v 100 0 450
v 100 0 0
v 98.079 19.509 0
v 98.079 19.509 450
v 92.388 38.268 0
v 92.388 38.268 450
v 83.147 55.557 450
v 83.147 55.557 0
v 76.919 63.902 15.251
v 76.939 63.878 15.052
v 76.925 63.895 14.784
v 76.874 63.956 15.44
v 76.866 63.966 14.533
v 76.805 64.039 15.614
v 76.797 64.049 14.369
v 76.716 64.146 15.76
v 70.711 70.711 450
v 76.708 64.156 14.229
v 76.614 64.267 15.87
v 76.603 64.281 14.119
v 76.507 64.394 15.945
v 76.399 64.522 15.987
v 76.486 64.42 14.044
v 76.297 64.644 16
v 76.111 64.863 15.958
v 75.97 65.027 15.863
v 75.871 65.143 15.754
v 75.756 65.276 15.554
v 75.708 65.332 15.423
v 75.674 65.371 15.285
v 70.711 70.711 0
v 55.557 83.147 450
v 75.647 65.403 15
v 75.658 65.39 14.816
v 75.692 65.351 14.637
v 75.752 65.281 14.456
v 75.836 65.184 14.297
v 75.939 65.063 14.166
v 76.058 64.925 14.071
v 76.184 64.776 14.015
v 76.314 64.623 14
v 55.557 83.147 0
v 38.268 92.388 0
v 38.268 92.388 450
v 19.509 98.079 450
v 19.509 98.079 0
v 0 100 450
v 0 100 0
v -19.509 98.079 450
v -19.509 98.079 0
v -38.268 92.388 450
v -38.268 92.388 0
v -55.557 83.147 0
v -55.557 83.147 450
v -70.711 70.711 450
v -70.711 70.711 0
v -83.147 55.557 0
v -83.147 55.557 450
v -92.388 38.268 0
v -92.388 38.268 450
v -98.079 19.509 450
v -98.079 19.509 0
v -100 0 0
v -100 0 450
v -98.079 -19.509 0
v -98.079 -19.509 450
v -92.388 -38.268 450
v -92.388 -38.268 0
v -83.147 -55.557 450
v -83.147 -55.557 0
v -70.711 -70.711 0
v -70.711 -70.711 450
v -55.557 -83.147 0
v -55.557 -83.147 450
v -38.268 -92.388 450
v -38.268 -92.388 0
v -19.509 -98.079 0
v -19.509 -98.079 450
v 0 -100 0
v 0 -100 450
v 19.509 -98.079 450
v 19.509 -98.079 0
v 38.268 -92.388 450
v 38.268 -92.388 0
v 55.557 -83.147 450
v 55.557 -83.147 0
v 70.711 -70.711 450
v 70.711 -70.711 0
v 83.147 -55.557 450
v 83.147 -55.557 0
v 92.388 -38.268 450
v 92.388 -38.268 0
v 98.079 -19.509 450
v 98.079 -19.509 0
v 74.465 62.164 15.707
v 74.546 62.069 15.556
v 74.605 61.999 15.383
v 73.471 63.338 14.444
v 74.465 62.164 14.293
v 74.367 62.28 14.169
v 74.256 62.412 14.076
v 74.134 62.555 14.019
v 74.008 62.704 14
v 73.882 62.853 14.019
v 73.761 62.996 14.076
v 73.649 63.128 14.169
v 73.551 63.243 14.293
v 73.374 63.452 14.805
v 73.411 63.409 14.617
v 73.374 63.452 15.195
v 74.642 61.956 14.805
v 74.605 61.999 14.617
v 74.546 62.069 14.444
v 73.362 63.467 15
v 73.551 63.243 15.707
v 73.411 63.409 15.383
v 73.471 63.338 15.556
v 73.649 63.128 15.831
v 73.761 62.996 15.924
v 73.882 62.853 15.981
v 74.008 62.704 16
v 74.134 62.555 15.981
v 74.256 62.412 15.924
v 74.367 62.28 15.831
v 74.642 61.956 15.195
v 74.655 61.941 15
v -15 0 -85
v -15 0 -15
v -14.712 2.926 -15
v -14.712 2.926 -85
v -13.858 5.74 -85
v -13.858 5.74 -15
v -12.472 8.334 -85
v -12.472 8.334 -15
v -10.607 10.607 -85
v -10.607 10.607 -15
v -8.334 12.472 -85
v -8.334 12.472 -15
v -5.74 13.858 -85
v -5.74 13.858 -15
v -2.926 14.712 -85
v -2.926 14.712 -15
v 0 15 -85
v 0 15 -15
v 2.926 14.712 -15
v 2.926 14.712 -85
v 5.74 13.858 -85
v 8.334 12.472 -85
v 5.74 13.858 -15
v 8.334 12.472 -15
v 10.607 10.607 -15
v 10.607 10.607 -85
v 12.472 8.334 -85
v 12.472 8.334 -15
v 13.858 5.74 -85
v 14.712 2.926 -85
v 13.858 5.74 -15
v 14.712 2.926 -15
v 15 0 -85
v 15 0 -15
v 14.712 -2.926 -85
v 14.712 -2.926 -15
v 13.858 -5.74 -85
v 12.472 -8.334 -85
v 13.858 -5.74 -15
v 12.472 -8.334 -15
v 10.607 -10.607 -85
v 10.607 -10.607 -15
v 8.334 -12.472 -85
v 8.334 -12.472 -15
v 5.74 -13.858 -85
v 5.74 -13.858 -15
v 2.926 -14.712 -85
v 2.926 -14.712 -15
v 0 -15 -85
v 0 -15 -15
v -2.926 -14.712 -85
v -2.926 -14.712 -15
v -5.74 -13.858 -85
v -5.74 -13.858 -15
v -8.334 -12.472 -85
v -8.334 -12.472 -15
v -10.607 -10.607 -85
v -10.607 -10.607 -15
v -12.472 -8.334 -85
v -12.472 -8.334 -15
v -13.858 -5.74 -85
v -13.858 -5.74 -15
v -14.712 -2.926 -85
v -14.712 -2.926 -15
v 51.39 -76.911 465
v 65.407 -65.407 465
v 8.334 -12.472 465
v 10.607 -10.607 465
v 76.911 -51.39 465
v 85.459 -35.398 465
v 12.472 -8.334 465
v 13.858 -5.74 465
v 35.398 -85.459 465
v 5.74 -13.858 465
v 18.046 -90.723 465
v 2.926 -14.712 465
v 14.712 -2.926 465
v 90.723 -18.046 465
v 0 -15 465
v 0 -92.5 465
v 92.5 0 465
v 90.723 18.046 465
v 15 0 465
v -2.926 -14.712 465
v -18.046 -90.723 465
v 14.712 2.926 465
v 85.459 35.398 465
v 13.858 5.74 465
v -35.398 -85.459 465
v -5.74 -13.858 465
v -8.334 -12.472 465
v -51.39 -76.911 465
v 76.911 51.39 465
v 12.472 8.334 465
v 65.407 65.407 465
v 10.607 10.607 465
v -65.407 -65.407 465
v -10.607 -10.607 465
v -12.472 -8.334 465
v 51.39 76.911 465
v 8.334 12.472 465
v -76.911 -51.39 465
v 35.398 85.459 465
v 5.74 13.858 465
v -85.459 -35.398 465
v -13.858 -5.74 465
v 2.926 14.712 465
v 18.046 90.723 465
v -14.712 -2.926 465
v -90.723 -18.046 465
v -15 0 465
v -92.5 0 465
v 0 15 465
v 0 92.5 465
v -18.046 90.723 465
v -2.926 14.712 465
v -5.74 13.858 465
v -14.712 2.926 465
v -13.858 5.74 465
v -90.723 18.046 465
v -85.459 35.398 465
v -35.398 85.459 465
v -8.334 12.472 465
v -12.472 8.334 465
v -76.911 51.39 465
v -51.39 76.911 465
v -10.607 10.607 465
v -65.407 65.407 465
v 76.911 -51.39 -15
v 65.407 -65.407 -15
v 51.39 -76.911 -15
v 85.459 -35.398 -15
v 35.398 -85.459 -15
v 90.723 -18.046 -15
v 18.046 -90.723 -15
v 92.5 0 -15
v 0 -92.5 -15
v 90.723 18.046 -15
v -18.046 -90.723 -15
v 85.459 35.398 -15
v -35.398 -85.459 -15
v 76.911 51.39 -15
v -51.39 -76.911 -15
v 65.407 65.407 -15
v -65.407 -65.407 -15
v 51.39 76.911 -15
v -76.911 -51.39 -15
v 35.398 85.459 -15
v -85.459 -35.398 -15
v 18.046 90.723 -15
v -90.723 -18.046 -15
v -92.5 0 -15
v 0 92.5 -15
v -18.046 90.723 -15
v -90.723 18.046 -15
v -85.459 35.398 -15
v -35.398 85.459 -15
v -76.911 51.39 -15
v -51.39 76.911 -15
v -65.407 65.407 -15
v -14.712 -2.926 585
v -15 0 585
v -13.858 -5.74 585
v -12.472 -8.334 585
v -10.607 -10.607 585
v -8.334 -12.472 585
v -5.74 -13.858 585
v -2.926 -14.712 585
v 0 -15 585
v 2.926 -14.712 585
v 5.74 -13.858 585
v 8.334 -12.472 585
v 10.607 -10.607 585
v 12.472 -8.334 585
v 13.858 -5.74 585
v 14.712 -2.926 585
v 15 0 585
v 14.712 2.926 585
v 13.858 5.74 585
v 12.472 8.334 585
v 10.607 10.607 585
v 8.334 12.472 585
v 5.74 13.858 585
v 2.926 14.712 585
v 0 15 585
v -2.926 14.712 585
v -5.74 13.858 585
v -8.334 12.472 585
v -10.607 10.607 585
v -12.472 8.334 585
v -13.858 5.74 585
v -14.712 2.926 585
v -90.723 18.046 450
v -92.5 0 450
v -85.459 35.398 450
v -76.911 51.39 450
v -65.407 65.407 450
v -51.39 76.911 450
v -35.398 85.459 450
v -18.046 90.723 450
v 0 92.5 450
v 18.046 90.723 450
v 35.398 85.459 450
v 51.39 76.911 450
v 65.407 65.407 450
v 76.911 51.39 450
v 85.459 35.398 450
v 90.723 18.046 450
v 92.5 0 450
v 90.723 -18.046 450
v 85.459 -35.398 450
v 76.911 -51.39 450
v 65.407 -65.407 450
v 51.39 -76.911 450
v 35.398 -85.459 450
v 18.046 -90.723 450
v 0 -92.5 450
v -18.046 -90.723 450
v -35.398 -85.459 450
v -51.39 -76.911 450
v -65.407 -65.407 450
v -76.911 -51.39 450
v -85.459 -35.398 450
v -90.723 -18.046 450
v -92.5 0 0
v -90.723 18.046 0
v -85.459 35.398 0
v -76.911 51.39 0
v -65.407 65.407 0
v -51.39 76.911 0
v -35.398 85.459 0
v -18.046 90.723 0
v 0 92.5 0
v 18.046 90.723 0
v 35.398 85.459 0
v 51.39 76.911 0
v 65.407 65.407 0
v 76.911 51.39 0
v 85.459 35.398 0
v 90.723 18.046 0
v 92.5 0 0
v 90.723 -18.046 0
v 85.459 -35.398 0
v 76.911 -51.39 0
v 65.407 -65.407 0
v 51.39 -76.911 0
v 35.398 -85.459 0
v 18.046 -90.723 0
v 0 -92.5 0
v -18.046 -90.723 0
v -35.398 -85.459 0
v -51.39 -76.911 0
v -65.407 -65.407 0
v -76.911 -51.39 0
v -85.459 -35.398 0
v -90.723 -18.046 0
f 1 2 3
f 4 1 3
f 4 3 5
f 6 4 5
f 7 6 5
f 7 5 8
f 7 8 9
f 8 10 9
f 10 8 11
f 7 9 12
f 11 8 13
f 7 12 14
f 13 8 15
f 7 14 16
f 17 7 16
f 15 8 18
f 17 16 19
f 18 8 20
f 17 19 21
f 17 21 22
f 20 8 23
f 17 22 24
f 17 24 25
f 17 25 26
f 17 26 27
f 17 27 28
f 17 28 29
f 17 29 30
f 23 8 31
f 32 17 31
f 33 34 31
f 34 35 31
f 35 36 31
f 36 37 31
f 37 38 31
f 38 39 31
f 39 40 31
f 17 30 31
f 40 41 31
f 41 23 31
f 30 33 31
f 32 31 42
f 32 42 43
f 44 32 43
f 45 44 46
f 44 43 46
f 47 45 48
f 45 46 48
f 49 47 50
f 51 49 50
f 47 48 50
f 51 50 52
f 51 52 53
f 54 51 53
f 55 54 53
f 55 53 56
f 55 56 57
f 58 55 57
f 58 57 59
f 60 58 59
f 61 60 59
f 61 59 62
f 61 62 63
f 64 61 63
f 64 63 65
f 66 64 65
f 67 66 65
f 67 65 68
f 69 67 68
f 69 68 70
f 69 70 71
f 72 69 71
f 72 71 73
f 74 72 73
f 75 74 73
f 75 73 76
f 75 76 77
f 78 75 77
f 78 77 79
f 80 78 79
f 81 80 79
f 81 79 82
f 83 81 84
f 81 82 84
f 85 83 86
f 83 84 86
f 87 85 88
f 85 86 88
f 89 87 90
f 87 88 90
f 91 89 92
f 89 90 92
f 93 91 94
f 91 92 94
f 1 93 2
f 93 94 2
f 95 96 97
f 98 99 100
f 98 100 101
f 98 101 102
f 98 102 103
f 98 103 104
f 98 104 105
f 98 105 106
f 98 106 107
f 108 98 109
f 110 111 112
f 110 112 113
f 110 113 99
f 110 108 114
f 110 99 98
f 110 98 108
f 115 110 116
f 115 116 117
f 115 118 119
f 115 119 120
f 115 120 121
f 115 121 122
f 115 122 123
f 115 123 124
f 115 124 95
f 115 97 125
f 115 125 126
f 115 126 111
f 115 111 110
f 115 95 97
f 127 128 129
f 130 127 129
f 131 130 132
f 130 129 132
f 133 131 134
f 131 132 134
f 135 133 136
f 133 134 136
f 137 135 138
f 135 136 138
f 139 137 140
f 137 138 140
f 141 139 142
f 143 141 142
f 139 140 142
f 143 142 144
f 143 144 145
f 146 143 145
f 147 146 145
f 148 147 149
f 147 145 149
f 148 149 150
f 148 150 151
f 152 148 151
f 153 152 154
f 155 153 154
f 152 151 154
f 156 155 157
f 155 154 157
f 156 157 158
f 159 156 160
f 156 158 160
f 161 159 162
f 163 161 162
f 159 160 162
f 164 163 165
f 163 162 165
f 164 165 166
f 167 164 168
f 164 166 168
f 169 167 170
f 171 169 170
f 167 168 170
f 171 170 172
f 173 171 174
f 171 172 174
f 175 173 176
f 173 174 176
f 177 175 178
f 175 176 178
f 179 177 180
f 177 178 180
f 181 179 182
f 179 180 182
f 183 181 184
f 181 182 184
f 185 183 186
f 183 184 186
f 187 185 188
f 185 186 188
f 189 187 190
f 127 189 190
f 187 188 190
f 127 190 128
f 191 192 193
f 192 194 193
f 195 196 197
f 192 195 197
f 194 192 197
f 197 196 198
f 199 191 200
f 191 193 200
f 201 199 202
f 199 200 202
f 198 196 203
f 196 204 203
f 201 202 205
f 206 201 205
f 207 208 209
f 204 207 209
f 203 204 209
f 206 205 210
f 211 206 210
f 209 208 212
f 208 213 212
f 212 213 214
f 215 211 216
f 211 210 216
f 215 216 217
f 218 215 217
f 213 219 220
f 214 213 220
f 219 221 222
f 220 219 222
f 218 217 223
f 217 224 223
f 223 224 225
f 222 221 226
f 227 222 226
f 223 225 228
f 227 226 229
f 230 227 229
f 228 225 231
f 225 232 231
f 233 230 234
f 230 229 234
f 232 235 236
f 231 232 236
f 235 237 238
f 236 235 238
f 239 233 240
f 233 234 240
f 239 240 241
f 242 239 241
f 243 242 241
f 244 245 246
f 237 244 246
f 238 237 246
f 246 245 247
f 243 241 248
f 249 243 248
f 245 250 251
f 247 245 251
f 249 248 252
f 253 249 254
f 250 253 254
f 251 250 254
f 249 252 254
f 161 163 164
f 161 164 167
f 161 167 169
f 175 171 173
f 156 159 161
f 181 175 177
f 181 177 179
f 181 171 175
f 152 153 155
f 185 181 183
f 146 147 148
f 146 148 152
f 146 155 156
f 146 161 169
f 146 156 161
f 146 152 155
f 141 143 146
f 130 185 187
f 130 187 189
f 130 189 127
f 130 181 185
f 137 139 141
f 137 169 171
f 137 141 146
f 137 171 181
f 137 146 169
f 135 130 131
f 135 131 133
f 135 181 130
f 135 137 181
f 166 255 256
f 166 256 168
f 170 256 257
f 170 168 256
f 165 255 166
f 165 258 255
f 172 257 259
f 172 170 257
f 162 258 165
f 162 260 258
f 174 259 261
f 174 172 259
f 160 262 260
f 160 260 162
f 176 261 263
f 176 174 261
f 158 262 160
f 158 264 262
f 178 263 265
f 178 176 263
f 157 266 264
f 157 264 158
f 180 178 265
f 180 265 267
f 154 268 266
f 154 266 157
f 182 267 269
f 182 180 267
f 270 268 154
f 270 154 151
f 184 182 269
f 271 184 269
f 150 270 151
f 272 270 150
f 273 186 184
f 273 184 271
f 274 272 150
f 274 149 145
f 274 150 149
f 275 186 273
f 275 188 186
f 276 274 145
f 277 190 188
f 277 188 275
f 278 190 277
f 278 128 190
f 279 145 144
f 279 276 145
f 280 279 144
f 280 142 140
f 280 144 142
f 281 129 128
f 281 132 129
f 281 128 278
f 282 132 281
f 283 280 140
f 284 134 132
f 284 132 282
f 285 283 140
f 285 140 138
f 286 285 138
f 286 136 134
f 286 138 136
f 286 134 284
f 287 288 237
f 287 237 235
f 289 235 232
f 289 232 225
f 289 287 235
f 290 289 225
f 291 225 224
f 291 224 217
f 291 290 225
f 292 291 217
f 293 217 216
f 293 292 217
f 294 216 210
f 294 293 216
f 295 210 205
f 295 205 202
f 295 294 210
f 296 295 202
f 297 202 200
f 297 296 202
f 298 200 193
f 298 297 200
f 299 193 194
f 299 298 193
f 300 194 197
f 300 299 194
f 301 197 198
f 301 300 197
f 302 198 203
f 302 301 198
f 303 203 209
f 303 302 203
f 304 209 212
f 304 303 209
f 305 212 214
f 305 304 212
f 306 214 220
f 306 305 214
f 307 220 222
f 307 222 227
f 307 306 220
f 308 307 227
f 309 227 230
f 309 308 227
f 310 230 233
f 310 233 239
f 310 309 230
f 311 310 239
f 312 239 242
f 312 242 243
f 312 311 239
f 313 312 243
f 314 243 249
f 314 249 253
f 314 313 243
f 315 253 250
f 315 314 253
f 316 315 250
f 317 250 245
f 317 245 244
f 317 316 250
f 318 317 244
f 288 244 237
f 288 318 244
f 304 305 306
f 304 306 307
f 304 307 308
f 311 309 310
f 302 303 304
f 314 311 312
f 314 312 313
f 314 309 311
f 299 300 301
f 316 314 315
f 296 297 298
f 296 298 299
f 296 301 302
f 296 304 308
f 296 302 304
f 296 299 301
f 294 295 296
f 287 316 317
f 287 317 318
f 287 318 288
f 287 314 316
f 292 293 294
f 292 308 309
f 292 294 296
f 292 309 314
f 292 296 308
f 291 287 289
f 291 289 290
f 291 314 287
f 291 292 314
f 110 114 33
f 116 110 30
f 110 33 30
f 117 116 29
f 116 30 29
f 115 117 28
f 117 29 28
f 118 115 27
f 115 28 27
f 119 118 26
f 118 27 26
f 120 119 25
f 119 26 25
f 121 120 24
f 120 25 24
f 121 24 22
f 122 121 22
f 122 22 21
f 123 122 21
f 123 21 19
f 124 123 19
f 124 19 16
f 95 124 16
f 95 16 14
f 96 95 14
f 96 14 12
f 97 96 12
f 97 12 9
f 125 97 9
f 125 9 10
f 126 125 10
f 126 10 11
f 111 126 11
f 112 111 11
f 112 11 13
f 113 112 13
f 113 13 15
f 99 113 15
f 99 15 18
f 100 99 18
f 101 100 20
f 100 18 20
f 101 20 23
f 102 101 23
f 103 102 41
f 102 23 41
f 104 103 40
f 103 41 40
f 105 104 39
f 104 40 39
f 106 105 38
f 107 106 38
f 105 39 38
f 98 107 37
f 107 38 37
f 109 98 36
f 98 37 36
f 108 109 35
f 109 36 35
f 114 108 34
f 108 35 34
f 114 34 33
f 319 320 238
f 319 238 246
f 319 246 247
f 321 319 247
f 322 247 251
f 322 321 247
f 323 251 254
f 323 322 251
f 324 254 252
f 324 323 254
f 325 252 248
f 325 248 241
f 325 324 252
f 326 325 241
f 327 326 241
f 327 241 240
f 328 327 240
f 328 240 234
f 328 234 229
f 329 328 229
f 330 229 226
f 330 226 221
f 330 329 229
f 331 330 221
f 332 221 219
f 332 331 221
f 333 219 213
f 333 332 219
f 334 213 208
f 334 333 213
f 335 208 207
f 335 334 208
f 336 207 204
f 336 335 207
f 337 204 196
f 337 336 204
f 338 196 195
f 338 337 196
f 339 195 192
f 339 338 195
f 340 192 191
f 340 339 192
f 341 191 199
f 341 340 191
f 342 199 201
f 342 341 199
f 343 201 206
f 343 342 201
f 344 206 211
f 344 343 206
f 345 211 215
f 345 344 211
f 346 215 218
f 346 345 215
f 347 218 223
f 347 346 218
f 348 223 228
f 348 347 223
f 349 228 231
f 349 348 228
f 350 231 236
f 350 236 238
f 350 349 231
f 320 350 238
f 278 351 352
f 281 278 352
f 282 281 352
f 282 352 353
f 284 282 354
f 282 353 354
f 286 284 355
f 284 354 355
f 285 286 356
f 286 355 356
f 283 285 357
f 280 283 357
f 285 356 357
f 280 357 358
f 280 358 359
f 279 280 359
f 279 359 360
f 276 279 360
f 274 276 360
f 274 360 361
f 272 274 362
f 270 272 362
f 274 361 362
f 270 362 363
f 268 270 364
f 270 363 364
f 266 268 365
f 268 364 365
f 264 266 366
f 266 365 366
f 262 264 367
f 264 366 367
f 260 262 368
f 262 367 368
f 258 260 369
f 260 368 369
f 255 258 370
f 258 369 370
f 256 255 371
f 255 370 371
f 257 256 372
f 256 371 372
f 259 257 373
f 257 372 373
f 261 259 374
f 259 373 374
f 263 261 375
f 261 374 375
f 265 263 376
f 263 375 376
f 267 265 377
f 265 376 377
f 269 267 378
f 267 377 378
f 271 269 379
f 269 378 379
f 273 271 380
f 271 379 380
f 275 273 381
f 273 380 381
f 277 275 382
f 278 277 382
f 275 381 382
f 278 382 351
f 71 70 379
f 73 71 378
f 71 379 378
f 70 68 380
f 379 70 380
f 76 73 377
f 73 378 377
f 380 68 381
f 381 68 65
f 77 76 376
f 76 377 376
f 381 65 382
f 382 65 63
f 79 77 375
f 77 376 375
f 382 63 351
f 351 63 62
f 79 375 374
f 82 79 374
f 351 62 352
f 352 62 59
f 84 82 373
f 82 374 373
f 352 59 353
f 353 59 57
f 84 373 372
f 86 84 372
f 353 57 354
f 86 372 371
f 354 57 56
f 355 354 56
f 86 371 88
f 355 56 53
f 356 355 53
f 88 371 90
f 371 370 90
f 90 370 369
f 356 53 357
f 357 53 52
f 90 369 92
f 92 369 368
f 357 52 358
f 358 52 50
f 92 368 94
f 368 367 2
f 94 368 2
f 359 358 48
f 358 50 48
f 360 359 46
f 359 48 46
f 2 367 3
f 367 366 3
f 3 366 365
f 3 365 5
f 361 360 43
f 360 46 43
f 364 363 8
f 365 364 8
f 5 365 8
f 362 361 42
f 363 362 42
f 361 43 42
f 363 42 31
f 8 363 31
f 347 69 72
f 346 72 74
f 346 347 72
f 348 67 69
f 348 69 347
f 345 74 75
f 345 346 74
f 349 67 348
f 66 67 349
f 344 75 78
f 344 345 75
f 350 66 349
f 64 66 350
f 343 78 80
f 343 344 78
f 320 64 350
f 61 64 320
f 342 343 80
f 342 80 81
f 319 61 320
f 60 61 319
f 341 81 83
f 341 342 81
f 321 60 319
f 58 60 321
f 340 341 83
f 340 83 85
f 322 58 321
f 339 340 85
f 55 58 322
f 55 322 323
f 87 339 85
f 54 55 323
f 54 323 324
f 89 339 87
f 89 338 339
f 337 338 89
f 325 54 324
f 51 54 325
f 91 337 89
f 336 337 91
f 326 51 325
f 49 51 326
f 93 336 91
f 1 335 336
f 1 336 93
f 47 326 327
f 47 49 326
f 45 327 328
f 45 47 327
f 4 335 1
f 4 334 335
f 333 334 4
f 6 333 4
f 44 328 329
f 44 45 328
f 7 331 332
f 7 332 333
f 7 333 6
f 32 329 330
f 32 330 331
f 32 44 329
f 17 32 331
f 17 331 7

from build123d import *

# Parameters (mm, degrees)
SKETCH1_R           = 100
BOSS_EXTRUDE1_DEPTH = 450
SKETCH2_R           = 92.5
BOSS_EXTRUDE2_DEPTH = 15
SKETCH3_R           = 15
BOSS_EXTRUDE3_DEPTH = 70
BOSS_EXTRUDE4_START = 120
SKETCH4_R           = 15
BOSS_EXTRUDE4_DEPTH = 120
SKETCH5_R           = 1
CUT_EXTRUDE1_DEPTH  = 3


with BuildPart() as part:
    # Sketch1 → Boss-Extrude1 (new body)
    with BuildSketch(Plane.XY):
        Circle(SKETCH1_R)
    extrude(amount=BOSS_EXTRUDE1_DEPTH)

    # Sketch2 → Boss-Extrude2 (add)
    with BuildSketch(Plane(origin=(0, 0, 0), x_dir=(-1, 0, 0), z_dir=(0, 0, -1))):
        Circle(SKETCH2_R)
    boss_extrude2 = extrude(amount=BOSS_EXTRUDE2_DEPTH)

    # Sketch3 → Boss-Extrude3 (add)
    with BuildSketch(Plane(origin=(0, 0, -15), x_dir=(-1, 0, 0), z_dir=(0, 0, -1))):
        Circle(SKETCH3_R)
    extrude(amount=BOSS_EXTRUDE3_DEPTH)

    # Mirror1: Boss-Extrude2 across plane
    add(boss_extrude2.mirror(Plane(origin=(0, 0, 225), x_dir=(1, 0, 0), z_dir=(0, 0, -1))))

    # Sketch4 → Boss-Extrude4 (add)
    with BuildSketch(Plane.XY.offset(465).offset(BOSS_EXTRUDE4_START)):
        Circle(SKETCH4_R)
    extrude(amount=-BOSS_EXTRUDE4_DEPTH)

    # Sketch5 → Cut-Extrude1 (cut)
    with BuildSketch(Plane(origin=(76.297187213, 64.643168421, 0), x_dir=(0, 0, -1), z_dir=(0.7629718721254075, 0.646431684206035, 0))):
        with Locations((-15, 0)):
            Circle(SKETCH5_R)
    extrude(amount=-CUT_EXTRUDE1_DEPTH, mode=Mode.SUBTRACT)


solid = part.part
